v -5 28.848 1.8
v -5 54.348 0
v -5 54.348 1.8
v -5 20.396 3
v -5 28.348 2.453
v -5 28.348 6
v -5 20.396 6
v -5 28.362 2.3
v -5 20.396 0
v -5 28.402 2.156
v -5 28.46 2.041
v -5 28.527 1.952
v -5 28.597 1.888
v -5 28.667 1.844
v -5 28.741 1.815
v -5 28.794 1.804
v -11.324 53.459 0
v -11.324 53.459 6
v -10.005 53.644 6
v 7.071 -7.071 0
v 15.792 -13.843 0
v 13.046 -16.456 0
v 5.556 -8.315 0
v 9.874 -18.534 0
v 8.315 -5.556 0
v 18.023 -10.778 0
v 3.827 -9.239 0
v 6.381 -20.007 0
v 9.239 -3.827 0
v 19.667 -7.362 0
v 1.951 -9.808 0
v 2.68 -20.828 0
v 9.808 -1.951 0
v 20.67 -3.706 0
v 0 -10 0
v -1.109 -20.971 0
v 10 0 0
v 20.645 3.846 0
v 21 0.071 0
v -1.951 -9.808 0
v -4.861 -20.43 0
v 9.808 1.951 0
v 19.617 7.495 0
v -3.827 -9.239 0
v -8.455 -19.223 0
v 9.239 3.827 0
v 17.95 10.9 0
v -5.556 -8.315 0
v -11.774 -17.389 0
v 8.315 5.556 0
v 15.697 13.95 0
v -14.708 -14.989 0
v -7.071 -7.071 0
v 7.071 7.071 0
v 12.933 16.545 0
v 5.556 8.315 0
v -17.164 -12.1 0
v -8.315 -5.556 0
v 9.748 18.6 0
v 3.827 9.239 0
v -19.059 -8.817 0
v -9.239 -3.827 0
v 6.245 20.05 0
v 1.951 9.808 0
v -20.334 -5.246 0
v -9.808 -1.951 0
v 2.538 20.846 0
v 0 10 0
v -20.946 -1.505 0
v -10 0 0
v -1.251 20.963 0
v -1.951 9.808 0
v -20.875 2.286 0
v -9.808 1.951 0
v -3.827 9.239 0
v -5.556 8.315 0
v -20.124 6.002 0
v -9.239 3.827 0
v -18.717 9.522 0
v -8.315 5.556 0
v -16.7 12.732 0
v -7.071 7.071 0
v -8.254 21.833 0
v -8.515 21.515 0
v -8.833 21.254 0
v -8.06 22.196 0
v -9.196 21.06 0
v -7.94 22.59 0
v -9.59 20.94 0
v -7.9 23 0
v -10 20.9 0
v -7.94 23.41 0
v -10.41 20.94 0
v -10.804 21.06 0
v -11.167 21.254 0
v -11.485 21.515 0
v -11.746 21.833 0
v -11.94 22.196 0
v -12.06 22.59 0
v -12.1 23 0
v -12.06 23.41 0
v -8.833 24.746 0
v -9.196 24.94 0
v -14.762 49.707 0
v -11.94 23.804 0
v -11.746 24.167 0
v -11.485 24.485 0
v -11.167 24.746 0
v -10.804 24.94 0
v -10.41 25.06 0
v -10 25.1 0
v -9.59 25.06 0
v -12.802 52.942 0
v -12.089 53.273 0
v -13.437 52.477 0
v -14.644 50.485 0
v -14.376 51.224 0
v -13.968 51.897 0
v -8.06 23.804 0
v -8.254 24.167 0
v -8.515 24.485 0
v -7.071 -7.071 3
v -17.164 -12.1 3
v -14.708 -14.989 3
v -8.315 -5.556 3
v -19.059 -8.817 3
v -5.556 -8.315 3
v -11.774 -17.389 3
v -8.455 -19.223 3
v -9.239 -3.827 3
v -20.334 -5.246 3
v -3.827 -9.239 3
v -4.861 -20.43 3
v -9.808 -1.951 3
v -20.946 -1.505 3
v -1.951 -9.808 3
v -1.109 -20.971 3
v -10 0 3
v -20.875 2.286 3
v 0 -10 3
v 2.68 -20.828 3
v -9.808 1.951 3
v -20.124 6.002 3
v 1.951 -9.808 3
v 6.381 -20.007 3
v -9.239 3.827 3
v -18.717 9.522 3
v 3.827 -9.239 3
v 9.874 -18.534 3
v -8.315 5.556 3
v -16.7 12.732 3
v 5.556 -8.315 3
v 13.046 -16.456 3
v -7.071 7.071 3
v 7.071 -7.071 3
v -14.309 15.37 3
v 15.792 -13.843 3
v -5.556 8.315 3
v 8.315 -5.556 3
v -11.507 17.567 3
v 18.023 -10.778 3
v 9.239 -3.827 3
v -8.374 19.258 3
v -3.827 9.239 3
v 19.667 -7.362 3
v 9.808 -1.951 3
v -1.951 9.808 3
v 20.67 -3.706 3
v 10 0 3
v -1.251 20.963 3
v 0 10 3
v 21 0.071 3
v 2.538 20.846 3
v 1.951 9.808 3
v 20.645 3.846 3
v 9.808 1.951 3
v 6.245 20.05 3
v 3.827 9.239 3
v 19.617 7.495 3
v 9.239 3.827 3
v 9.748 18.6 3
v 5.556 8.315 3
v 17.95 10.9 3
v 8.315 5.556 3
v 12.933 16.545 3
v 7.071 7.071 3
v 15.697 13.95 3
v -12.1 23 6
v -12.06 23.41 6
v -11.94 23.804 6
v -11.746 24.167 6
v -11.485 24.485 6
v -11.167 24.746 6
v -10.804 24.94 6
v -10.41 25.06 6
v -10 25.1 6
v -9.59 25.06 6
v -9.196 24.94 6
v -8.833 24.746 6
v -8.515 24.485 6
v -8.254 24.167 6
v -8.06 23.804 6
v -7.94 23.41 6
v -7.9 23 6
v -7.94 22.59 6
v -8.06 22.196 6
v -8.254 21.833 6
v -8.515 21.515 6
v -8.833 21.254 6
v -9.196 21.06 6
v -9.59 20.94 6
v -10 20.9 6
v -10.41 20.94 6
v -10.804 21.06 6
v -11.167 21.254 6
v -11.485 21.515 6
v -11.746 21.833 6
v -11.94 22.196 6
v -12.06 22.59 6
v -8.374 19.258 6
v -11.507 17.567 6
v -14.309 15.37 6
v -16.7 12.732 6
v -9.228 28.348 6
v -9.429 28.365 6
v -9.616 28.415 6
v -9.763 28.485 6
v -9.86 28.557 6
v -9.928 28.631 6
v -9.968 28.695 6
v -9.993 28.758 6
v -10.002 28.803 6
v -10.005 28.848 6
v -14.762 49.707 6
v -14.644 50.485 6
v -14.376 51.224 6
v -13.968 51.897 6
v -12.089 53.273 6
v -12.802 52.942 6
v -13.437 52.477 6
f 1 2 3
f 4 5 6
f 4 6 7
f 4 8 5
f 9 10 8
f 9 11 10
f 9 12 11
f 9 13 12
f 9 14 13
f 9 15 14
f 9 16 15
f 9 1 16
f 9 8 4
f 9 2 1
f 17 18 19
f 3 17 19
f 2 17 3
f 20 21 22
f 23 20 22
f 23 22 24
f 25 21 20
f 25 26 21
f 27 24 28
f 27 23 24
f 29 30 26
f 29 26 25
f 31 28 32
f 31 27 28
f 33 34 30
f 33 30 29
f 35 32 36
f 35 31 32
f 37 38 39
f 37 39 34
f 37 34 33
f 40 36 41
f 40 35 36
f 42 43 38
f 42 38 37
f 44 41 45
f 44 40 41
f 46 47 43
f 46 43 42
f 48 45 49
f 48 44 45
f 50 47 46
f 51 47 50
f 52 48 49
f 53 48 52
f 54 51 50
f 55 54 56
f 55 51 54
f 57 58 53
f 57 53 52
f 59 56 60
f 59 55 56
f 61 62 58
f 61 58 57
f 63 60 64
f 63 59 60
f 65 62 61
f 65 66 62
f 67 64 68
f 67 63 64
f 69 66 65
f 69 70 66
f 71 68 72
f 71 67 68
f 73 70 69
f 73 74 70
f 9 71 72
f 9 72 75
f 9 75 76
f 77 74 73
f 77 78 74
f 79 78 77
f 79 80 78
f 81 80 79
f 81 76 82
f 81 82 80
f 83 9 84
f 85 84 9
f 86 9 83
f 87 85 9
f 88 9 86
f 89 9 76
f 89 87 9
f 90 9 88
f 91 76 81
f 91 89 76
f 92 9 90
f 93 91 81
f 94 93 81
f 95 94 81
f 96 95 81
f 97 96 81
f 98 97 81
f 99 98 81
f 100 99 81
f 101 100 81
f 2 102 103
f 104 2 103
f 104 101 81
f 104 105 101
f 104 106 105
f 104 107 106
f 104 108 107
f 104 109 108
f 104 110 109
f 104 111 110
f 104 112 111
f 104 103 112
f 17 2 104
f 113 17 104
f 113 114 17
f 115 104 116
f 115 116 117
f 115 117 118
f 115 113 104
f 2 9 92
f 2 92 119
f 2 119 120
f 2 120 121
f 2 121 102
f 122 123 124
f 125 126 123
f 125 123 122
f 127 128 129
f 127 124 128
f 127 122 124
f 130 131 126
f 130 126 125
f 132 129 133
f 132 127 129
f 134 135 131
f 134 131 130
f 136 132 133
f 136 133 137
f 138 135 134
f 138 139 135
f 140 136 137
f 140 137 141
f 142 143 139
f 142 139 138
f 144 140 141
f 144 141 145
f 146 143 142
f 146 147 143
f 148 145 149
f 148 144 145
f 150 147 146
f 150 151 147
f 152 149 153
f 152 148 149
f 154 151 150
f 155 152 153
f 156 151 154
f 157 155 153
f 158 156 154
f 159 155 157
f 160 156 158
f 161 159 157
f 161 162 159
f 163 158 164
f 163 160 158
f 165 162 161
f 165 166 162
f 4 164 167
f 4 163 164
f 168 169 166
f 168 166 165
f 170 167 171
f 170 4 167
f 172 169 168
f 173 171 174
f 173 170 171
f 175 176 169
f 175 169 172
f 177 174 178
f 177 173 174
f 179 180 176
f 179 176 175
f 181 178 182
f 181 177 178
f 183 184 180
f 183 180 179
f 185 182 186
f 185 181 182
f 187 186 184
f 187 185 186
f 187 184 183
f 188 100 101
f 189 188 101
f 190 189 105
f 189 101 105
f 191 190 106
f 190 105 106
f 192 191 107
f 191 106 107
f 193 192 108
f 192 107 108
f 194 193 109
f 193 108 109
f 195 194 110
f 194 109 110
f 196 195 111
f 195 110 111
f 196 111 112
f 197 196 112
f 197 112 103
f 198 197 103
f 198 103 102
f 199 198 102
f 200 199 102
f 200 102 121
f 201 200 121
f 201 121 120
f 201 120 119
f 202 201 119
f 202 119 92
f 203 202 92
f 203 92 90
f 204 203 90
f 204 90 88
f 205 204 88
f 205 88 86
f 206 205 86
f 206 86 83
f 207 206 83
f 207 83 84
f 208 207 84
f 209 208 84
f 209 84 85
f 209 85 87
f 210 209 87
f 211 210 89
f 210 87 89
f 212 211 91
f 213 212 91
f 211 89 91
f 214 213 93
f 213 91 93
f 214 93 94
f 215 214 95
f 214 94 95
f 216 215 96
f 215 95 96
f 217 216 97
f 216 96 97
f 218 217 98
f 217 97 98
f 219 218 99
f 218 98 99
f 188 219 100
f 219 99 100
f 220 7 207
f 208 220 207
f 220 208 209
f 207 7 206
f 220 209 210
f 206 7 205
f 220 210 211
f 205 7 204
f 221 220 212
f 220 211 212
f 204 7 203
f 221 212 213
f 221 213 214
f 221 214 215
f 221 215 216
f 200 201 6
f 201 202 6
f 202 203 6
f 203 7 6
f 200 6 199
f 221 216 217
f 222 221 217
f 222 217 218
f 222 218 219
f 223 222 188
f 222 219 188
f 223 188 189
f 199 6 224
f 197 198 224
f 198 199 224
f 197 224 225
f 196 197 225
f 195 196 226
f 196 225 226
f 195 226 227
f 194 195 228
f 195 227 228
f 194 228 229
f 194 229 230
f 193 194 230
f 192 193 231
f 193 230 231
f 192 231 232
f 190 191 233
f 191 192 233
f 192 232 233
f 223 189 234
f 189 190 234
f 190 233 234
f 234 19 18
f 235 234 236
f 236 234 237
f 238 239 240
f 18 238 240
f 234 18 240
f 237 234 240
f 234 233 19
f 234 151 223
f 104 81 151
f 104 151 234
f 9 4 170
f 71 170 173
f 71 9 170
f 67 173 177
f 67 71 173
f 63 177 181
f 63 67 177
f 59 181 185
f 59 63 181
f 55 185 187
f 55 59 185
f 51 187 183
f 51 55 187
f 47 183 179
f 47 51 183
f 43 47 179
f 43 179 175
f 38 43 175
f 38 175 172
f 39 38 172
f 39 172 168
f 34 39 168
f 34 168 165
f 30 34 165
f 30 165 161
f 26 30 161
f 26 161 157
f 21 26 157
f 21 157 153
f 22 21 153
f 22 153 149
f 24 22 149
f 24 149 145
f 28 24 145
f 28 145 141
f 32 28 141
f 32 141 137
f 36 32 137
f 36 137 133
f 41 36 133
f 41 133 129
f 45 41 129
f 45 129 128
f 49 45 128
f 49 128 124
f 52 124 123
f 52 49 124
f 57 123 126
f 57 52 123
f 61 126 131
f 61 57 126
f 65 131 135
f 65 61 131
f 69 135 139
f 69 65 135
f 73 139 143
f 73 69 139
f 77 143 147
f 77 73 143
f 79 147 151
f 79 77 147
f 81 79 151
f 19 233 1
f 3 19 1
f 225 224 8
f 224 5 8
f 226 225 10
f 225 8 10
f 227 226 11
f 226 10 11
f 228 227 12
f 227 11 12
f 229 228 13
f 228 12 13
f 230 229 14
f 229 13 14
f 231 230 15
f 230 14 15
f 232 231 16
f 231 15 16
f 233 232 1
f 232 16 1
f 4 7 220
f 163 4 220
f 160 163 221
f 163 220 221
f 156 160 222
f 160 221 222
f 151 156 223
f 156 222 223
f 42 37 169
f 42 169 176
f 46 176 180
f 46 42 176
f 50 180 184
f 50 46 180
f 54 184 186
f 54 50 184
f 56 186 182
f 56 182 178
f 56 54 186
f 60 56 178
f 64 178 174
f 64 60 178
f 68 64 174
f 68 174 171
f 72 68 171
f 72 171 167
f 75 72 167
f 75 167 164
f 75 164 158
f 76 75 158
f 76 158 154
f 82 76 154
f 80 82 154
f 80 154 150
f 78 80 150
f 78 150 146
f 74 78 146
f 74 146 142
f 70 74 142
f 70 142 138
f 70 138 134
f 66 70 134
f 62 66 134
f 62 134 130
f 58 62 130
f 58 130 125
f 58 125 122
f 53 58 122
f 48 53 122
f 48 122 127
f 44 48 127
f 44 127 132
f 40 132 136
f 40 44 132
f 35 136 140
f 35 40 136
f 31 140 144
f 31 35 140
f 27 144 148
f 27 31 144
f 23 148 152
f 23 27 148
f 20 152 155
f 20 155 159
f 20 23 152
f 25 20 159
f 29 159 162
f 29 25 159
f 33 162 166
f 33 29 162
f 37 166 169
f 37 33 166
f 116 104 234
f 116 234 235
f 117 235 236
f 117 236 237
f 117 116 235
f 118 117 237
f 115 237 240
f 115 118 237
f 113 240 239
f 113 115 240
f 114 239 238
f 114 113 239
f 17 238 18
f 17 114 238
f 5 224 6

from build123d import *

# Parameters (mm, degrees)
CROQUIS1_R                = 10
SALIENTE_EXTRUIR1_DEPTH   = 6
CROQUIS2_R                = 21
CROQUIS2_R_2              = 10
CORTAR_EXTRUIR1_DEPTH     = 3
CORTAR_EXTRUIR2_DEPTH     = 26
REDONDEO1_R               = 0.5
TALADRO_ROSCADO_M51_D     = 4.2
TALADRO_ROSCADO_M51_DEPTH = 14
TALADRO_ROSCADO_M51_TIP   = 1.2618073


with BuildPart() as part:
    # Croquis1 → Saliente-Extruir1 (new body)
    with BuildSketch(Plane.XY):
        with BuildLine():
            Line((-16.7, 12.732242536), (-14.762225987, 49.707173354))
            ThreePointArc((-14.762225987, 49.707173354), (-13.716817195, 52.20019036), (-11.324400252, 53.458901804))
            Line((-11.324400252, 53.458901804), (-5, 54.347738295))
            Line((-5, 54.347738295), (-5, 20.396078054))
            ThreePointArc((-5, 20.396078054), (11.506784682, -17.566841102), (-16.7, 12.732242536))
        make_face()
        Circle(CROQUIS1_R, mode=Mode.SUBTRACT)
    extrude(amount=SALIENTE_EXTRUIR1_DEPTH)

    # Croquis2 → Cortar-Extruir1 (cut)
    with BuildSketch(Plane.XY.offset(6)):
        Circle(CROQUIS2_R)
        Circle(CROQUIS2_R_2, mode=Mode.SUBTRACT)
    extrude(amount=-CORTAR_EXTRUIR1_DEPTH, mode=Mode.SUBTRACT)

    # Croquis3 → Cortar-Extruir2 (cut)
    with BuildSketch(Plane(origin=(0, 54.347738295, 0), x_dir=(-1, 0, 0), z_dir=(0, 1, 0))):
        Polygon((10.005365089, 6), (5, 1.8), (5, 6), align=None)
    extrude(amount=-CORTAR_EXTRUIR2_DEPTH, mode=Mode.SUBTRACT)

    # Redondeo1
    redondeo1_edges = [part.edges().sort_by_distance(p)[0] for p in [
        (-7.502682544, 28.347738295, 3.9),
    ]]
    fillet(redondeo1_edges, radius=REDONDEO1_R)

    # Taladro roscado M51
    with Locations(Plane.XY.offset(6)):
        with Locations((-10, 23)):
            Hole(TALADRO_ROSCADO_M51_D / 2, depth=TALADRO_ROSCADO_M51_DEPTH)
            with Locations((0, 0, -(TALADRO_ROSCADO_M51_DEPTH + TALADRO_ROSCADO_M51_TIP / 2))):  # 118° drill point
                Cone(0, TALADRO_ROSCADO_M51_D / 2, TALADRO_ROSCADO_M51_TIP, mode=Mode.SUBTRACT)


solid = part.part
